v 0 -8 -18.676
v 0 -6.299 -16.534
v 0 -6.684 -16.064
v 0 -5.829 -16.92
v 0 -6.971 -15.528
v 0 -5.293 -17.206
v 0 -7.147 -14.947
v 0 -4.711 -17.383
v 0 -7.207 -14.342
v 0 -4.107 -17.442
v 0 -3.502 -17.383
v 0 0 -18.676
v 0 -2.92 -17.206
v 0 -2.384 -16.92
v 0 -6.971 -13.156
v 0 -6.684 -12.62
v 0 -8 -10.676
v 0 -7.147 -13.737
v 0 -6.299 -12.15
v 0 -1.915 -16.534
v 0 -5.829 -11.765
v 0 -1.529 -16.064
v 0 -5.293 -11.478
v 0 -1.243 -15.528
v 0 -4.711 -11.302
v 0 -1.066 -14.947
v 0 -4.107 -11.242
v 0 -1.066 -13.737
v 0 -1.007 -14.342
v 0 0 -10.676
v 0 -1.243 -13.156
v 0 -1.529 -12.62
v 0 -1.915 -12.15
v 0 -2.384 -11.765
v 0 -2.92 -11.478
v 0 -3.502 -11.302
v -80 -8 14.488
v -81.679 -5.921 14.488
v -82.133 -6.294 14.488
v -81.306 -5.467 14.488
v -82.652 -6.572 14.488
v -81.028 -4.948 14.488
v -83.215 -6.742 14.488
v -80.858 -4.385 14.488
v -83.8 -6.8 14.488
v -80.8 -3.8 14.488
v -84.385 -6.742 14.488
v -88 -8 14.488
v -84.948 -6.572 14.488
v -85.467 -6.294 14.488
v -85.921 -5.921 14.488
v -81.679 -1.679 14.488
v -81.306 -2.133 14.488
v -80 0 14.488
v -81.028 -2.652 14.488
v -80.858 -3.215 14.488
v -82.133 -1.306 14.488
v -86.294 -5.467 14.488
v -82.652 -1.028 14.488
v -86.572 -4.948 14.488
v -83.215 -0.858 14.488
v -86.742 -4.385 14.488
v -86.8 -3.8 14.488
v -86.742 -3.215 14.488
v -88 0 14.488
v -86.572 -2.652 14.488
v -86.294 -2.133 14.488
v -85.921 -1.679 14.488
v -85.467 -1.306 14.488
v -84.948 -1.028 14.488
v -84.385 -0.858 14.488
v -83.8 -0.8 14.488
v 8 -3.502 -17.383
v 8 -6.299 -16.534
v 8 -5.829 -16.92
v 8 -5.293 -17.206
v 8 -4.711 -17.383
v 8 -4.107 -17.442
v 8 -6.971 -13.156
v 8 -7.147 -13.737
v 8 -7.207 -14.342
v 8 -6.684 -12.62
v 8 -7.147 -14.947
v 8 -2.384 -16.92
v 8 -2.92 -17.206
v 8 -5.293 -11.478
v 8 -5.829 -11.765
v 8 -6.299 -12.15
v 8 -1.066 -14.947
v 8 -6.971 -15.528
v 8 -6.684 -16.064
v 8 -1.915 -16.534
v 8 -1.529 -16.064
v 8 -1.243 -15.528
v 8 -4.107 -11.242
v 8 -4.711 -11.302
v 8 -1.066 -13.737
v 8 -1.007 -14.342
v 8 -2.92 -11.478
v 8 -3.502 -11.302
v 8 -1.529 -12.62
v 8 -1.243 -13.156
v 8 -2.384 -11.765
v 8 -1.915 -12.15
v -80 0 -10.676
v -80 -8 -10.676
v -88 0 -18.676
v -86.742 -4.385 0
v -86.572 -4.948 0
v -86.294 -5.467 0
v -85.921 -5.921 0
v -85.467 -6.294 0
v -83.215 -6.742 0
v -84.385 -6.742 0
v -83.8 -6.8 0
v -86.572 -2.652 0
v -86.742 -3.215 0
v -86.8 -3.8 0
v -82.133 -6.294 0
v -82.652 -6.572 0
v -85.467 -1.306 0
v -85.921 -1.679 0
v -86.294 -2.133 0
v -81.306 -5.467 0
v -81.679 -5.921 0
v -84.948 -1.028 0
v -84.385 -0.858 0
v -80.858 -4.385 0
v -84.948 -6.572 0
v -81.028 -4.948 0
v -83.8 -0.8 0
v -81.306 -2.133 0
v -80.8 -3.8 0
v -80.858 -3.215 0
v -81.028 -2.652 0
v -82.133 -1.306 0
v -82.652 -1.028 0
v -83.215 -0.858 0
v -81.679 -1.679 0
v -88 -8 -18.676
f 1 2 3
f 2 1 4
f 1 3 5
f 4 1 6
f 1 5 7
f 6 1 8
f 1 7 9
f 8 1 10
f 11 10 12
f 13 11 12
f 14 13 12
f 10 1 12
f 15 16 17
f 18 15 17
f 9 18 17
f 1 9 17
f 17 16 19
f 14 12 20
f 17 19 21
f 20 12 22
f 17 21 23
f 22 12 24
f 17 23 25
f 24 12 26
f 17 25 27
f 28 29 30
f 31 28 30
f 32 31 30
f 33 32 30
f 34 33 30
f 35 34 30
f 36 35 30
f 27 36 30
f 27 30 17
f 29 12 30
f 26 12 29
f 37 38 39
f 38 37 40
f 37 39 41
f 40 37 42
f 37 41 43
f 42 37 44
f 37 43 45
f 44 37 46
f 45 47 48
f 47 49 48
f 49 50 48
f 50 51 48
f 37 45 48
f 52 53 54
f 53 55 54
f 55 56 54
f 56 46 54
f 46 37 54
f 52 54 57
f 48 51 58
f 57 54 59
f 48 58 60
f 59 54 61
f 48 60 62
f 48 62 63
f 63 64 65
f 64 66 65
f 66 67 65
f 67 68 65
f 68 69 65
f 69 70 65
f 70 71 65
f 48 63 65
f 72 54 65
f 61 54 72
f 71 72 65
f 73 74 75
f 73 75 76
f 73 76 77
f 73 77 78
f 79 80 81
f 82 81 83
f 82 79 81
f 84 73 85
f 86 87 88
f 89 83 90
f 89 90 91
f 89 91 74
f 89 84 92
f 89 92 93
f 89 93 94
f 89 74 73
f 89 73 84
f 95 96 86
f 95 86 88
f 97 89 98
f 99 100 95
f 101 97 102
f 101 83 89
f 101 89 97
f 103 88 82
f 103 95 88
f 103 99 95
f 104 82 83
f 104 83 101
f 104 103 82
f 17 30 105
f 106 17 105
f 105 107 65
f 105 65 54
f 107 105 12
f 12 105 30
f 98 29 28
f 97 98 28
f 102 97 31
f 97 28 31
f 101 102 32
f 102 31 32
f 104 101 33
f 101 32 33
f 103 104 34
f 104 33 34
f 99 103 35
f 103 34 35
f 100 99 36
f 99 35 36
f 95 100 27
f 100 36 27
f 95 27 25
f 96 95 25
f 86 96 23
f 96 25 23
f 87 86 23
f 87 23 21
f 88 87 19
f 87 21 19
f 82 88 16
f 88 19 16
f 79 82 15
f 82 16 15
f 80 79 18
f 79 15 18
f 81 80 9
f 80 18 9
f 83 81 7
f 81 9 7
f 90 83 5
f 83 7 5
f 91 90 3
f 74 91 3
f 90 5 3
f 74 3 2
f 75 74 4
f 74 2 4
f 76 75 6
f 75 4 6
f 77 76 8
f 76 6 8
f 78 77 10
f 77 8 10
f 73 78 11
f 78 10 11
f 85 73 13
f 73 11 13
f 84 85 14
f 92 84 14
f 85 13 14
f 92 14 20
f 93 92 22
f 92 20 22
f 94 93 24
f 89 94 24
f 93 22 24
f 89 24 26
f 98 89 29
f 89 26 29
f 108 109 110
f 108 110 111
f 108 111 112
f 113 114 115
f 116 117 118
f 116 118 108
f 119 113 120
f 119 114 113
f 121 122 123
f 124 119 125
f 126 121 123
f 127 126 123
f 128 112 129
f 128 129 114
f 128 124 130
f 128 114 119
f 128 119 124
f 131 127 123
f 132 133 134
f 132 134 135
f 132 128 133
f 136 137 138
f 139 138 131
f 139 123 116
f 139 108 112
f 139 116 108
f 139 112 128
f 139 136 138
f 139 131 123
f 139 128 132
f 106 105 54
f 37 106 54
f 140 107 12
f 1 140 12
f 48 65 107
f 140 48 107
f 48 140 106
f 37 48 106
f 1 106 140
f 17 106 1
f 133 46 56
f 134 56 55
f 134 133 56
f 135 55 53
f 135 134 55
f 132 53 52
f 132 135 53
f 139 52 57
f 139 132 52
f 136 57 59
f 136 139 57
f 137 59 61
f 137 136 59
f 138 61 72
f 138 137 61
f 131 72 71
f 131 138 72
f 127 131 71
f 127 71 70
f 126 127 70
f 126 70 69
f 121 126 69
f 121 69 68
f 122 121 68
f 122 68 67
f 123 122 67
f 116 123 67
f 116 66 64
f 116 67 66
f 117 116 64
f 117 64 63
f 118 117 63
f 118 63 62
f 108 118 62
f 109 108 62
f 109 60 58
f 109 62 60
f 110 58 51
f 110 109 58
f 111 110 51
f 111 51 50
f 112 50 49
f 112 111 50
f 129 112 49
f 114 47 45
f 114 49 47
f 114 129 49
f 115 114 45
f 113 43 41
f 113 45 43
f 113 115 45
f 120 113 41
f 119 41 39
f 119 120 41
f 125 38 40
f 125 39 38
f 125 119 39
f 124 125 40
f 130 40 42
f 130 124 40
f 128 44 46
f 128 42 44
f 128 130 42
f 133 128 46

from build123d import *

# Parameters (mm, degrees)
F1_DEPTH = 8
F2_R     = 3.1
F3_DEPTH = 8
F4_R     = 3
F5_DEPTH = 16


with BuildPart() as f1:
    # F0 (on Front) → F1 (new body)
    with BuildSketch(Plane.XZ):
        Polygon((-80, -10.675645), (-80, 14.487543), (-88, 14.487543), (-88, -18.675645), (0, -18.675645), (0, -10.675645), align=None)
    extrude(amount=F1_DEPTH)

    # F2 (on Right) → F3 (join)
    with BuildSketch(Plane.YZ):
        with Locations((-4.106534, -14.342085)):
            Circle(F2_R)
    extrude(amount=F3_DEPTH)

    # F4 (on Top) → F5 (cut)
    with BuildSketch(Plane.XY):
        with Locations((-83.8, -3.8)):
            Circle(F4_R)
    extrude(amount=F5_DEPTH, mode=Mode.SUBTRACT)


solid = f1.part
